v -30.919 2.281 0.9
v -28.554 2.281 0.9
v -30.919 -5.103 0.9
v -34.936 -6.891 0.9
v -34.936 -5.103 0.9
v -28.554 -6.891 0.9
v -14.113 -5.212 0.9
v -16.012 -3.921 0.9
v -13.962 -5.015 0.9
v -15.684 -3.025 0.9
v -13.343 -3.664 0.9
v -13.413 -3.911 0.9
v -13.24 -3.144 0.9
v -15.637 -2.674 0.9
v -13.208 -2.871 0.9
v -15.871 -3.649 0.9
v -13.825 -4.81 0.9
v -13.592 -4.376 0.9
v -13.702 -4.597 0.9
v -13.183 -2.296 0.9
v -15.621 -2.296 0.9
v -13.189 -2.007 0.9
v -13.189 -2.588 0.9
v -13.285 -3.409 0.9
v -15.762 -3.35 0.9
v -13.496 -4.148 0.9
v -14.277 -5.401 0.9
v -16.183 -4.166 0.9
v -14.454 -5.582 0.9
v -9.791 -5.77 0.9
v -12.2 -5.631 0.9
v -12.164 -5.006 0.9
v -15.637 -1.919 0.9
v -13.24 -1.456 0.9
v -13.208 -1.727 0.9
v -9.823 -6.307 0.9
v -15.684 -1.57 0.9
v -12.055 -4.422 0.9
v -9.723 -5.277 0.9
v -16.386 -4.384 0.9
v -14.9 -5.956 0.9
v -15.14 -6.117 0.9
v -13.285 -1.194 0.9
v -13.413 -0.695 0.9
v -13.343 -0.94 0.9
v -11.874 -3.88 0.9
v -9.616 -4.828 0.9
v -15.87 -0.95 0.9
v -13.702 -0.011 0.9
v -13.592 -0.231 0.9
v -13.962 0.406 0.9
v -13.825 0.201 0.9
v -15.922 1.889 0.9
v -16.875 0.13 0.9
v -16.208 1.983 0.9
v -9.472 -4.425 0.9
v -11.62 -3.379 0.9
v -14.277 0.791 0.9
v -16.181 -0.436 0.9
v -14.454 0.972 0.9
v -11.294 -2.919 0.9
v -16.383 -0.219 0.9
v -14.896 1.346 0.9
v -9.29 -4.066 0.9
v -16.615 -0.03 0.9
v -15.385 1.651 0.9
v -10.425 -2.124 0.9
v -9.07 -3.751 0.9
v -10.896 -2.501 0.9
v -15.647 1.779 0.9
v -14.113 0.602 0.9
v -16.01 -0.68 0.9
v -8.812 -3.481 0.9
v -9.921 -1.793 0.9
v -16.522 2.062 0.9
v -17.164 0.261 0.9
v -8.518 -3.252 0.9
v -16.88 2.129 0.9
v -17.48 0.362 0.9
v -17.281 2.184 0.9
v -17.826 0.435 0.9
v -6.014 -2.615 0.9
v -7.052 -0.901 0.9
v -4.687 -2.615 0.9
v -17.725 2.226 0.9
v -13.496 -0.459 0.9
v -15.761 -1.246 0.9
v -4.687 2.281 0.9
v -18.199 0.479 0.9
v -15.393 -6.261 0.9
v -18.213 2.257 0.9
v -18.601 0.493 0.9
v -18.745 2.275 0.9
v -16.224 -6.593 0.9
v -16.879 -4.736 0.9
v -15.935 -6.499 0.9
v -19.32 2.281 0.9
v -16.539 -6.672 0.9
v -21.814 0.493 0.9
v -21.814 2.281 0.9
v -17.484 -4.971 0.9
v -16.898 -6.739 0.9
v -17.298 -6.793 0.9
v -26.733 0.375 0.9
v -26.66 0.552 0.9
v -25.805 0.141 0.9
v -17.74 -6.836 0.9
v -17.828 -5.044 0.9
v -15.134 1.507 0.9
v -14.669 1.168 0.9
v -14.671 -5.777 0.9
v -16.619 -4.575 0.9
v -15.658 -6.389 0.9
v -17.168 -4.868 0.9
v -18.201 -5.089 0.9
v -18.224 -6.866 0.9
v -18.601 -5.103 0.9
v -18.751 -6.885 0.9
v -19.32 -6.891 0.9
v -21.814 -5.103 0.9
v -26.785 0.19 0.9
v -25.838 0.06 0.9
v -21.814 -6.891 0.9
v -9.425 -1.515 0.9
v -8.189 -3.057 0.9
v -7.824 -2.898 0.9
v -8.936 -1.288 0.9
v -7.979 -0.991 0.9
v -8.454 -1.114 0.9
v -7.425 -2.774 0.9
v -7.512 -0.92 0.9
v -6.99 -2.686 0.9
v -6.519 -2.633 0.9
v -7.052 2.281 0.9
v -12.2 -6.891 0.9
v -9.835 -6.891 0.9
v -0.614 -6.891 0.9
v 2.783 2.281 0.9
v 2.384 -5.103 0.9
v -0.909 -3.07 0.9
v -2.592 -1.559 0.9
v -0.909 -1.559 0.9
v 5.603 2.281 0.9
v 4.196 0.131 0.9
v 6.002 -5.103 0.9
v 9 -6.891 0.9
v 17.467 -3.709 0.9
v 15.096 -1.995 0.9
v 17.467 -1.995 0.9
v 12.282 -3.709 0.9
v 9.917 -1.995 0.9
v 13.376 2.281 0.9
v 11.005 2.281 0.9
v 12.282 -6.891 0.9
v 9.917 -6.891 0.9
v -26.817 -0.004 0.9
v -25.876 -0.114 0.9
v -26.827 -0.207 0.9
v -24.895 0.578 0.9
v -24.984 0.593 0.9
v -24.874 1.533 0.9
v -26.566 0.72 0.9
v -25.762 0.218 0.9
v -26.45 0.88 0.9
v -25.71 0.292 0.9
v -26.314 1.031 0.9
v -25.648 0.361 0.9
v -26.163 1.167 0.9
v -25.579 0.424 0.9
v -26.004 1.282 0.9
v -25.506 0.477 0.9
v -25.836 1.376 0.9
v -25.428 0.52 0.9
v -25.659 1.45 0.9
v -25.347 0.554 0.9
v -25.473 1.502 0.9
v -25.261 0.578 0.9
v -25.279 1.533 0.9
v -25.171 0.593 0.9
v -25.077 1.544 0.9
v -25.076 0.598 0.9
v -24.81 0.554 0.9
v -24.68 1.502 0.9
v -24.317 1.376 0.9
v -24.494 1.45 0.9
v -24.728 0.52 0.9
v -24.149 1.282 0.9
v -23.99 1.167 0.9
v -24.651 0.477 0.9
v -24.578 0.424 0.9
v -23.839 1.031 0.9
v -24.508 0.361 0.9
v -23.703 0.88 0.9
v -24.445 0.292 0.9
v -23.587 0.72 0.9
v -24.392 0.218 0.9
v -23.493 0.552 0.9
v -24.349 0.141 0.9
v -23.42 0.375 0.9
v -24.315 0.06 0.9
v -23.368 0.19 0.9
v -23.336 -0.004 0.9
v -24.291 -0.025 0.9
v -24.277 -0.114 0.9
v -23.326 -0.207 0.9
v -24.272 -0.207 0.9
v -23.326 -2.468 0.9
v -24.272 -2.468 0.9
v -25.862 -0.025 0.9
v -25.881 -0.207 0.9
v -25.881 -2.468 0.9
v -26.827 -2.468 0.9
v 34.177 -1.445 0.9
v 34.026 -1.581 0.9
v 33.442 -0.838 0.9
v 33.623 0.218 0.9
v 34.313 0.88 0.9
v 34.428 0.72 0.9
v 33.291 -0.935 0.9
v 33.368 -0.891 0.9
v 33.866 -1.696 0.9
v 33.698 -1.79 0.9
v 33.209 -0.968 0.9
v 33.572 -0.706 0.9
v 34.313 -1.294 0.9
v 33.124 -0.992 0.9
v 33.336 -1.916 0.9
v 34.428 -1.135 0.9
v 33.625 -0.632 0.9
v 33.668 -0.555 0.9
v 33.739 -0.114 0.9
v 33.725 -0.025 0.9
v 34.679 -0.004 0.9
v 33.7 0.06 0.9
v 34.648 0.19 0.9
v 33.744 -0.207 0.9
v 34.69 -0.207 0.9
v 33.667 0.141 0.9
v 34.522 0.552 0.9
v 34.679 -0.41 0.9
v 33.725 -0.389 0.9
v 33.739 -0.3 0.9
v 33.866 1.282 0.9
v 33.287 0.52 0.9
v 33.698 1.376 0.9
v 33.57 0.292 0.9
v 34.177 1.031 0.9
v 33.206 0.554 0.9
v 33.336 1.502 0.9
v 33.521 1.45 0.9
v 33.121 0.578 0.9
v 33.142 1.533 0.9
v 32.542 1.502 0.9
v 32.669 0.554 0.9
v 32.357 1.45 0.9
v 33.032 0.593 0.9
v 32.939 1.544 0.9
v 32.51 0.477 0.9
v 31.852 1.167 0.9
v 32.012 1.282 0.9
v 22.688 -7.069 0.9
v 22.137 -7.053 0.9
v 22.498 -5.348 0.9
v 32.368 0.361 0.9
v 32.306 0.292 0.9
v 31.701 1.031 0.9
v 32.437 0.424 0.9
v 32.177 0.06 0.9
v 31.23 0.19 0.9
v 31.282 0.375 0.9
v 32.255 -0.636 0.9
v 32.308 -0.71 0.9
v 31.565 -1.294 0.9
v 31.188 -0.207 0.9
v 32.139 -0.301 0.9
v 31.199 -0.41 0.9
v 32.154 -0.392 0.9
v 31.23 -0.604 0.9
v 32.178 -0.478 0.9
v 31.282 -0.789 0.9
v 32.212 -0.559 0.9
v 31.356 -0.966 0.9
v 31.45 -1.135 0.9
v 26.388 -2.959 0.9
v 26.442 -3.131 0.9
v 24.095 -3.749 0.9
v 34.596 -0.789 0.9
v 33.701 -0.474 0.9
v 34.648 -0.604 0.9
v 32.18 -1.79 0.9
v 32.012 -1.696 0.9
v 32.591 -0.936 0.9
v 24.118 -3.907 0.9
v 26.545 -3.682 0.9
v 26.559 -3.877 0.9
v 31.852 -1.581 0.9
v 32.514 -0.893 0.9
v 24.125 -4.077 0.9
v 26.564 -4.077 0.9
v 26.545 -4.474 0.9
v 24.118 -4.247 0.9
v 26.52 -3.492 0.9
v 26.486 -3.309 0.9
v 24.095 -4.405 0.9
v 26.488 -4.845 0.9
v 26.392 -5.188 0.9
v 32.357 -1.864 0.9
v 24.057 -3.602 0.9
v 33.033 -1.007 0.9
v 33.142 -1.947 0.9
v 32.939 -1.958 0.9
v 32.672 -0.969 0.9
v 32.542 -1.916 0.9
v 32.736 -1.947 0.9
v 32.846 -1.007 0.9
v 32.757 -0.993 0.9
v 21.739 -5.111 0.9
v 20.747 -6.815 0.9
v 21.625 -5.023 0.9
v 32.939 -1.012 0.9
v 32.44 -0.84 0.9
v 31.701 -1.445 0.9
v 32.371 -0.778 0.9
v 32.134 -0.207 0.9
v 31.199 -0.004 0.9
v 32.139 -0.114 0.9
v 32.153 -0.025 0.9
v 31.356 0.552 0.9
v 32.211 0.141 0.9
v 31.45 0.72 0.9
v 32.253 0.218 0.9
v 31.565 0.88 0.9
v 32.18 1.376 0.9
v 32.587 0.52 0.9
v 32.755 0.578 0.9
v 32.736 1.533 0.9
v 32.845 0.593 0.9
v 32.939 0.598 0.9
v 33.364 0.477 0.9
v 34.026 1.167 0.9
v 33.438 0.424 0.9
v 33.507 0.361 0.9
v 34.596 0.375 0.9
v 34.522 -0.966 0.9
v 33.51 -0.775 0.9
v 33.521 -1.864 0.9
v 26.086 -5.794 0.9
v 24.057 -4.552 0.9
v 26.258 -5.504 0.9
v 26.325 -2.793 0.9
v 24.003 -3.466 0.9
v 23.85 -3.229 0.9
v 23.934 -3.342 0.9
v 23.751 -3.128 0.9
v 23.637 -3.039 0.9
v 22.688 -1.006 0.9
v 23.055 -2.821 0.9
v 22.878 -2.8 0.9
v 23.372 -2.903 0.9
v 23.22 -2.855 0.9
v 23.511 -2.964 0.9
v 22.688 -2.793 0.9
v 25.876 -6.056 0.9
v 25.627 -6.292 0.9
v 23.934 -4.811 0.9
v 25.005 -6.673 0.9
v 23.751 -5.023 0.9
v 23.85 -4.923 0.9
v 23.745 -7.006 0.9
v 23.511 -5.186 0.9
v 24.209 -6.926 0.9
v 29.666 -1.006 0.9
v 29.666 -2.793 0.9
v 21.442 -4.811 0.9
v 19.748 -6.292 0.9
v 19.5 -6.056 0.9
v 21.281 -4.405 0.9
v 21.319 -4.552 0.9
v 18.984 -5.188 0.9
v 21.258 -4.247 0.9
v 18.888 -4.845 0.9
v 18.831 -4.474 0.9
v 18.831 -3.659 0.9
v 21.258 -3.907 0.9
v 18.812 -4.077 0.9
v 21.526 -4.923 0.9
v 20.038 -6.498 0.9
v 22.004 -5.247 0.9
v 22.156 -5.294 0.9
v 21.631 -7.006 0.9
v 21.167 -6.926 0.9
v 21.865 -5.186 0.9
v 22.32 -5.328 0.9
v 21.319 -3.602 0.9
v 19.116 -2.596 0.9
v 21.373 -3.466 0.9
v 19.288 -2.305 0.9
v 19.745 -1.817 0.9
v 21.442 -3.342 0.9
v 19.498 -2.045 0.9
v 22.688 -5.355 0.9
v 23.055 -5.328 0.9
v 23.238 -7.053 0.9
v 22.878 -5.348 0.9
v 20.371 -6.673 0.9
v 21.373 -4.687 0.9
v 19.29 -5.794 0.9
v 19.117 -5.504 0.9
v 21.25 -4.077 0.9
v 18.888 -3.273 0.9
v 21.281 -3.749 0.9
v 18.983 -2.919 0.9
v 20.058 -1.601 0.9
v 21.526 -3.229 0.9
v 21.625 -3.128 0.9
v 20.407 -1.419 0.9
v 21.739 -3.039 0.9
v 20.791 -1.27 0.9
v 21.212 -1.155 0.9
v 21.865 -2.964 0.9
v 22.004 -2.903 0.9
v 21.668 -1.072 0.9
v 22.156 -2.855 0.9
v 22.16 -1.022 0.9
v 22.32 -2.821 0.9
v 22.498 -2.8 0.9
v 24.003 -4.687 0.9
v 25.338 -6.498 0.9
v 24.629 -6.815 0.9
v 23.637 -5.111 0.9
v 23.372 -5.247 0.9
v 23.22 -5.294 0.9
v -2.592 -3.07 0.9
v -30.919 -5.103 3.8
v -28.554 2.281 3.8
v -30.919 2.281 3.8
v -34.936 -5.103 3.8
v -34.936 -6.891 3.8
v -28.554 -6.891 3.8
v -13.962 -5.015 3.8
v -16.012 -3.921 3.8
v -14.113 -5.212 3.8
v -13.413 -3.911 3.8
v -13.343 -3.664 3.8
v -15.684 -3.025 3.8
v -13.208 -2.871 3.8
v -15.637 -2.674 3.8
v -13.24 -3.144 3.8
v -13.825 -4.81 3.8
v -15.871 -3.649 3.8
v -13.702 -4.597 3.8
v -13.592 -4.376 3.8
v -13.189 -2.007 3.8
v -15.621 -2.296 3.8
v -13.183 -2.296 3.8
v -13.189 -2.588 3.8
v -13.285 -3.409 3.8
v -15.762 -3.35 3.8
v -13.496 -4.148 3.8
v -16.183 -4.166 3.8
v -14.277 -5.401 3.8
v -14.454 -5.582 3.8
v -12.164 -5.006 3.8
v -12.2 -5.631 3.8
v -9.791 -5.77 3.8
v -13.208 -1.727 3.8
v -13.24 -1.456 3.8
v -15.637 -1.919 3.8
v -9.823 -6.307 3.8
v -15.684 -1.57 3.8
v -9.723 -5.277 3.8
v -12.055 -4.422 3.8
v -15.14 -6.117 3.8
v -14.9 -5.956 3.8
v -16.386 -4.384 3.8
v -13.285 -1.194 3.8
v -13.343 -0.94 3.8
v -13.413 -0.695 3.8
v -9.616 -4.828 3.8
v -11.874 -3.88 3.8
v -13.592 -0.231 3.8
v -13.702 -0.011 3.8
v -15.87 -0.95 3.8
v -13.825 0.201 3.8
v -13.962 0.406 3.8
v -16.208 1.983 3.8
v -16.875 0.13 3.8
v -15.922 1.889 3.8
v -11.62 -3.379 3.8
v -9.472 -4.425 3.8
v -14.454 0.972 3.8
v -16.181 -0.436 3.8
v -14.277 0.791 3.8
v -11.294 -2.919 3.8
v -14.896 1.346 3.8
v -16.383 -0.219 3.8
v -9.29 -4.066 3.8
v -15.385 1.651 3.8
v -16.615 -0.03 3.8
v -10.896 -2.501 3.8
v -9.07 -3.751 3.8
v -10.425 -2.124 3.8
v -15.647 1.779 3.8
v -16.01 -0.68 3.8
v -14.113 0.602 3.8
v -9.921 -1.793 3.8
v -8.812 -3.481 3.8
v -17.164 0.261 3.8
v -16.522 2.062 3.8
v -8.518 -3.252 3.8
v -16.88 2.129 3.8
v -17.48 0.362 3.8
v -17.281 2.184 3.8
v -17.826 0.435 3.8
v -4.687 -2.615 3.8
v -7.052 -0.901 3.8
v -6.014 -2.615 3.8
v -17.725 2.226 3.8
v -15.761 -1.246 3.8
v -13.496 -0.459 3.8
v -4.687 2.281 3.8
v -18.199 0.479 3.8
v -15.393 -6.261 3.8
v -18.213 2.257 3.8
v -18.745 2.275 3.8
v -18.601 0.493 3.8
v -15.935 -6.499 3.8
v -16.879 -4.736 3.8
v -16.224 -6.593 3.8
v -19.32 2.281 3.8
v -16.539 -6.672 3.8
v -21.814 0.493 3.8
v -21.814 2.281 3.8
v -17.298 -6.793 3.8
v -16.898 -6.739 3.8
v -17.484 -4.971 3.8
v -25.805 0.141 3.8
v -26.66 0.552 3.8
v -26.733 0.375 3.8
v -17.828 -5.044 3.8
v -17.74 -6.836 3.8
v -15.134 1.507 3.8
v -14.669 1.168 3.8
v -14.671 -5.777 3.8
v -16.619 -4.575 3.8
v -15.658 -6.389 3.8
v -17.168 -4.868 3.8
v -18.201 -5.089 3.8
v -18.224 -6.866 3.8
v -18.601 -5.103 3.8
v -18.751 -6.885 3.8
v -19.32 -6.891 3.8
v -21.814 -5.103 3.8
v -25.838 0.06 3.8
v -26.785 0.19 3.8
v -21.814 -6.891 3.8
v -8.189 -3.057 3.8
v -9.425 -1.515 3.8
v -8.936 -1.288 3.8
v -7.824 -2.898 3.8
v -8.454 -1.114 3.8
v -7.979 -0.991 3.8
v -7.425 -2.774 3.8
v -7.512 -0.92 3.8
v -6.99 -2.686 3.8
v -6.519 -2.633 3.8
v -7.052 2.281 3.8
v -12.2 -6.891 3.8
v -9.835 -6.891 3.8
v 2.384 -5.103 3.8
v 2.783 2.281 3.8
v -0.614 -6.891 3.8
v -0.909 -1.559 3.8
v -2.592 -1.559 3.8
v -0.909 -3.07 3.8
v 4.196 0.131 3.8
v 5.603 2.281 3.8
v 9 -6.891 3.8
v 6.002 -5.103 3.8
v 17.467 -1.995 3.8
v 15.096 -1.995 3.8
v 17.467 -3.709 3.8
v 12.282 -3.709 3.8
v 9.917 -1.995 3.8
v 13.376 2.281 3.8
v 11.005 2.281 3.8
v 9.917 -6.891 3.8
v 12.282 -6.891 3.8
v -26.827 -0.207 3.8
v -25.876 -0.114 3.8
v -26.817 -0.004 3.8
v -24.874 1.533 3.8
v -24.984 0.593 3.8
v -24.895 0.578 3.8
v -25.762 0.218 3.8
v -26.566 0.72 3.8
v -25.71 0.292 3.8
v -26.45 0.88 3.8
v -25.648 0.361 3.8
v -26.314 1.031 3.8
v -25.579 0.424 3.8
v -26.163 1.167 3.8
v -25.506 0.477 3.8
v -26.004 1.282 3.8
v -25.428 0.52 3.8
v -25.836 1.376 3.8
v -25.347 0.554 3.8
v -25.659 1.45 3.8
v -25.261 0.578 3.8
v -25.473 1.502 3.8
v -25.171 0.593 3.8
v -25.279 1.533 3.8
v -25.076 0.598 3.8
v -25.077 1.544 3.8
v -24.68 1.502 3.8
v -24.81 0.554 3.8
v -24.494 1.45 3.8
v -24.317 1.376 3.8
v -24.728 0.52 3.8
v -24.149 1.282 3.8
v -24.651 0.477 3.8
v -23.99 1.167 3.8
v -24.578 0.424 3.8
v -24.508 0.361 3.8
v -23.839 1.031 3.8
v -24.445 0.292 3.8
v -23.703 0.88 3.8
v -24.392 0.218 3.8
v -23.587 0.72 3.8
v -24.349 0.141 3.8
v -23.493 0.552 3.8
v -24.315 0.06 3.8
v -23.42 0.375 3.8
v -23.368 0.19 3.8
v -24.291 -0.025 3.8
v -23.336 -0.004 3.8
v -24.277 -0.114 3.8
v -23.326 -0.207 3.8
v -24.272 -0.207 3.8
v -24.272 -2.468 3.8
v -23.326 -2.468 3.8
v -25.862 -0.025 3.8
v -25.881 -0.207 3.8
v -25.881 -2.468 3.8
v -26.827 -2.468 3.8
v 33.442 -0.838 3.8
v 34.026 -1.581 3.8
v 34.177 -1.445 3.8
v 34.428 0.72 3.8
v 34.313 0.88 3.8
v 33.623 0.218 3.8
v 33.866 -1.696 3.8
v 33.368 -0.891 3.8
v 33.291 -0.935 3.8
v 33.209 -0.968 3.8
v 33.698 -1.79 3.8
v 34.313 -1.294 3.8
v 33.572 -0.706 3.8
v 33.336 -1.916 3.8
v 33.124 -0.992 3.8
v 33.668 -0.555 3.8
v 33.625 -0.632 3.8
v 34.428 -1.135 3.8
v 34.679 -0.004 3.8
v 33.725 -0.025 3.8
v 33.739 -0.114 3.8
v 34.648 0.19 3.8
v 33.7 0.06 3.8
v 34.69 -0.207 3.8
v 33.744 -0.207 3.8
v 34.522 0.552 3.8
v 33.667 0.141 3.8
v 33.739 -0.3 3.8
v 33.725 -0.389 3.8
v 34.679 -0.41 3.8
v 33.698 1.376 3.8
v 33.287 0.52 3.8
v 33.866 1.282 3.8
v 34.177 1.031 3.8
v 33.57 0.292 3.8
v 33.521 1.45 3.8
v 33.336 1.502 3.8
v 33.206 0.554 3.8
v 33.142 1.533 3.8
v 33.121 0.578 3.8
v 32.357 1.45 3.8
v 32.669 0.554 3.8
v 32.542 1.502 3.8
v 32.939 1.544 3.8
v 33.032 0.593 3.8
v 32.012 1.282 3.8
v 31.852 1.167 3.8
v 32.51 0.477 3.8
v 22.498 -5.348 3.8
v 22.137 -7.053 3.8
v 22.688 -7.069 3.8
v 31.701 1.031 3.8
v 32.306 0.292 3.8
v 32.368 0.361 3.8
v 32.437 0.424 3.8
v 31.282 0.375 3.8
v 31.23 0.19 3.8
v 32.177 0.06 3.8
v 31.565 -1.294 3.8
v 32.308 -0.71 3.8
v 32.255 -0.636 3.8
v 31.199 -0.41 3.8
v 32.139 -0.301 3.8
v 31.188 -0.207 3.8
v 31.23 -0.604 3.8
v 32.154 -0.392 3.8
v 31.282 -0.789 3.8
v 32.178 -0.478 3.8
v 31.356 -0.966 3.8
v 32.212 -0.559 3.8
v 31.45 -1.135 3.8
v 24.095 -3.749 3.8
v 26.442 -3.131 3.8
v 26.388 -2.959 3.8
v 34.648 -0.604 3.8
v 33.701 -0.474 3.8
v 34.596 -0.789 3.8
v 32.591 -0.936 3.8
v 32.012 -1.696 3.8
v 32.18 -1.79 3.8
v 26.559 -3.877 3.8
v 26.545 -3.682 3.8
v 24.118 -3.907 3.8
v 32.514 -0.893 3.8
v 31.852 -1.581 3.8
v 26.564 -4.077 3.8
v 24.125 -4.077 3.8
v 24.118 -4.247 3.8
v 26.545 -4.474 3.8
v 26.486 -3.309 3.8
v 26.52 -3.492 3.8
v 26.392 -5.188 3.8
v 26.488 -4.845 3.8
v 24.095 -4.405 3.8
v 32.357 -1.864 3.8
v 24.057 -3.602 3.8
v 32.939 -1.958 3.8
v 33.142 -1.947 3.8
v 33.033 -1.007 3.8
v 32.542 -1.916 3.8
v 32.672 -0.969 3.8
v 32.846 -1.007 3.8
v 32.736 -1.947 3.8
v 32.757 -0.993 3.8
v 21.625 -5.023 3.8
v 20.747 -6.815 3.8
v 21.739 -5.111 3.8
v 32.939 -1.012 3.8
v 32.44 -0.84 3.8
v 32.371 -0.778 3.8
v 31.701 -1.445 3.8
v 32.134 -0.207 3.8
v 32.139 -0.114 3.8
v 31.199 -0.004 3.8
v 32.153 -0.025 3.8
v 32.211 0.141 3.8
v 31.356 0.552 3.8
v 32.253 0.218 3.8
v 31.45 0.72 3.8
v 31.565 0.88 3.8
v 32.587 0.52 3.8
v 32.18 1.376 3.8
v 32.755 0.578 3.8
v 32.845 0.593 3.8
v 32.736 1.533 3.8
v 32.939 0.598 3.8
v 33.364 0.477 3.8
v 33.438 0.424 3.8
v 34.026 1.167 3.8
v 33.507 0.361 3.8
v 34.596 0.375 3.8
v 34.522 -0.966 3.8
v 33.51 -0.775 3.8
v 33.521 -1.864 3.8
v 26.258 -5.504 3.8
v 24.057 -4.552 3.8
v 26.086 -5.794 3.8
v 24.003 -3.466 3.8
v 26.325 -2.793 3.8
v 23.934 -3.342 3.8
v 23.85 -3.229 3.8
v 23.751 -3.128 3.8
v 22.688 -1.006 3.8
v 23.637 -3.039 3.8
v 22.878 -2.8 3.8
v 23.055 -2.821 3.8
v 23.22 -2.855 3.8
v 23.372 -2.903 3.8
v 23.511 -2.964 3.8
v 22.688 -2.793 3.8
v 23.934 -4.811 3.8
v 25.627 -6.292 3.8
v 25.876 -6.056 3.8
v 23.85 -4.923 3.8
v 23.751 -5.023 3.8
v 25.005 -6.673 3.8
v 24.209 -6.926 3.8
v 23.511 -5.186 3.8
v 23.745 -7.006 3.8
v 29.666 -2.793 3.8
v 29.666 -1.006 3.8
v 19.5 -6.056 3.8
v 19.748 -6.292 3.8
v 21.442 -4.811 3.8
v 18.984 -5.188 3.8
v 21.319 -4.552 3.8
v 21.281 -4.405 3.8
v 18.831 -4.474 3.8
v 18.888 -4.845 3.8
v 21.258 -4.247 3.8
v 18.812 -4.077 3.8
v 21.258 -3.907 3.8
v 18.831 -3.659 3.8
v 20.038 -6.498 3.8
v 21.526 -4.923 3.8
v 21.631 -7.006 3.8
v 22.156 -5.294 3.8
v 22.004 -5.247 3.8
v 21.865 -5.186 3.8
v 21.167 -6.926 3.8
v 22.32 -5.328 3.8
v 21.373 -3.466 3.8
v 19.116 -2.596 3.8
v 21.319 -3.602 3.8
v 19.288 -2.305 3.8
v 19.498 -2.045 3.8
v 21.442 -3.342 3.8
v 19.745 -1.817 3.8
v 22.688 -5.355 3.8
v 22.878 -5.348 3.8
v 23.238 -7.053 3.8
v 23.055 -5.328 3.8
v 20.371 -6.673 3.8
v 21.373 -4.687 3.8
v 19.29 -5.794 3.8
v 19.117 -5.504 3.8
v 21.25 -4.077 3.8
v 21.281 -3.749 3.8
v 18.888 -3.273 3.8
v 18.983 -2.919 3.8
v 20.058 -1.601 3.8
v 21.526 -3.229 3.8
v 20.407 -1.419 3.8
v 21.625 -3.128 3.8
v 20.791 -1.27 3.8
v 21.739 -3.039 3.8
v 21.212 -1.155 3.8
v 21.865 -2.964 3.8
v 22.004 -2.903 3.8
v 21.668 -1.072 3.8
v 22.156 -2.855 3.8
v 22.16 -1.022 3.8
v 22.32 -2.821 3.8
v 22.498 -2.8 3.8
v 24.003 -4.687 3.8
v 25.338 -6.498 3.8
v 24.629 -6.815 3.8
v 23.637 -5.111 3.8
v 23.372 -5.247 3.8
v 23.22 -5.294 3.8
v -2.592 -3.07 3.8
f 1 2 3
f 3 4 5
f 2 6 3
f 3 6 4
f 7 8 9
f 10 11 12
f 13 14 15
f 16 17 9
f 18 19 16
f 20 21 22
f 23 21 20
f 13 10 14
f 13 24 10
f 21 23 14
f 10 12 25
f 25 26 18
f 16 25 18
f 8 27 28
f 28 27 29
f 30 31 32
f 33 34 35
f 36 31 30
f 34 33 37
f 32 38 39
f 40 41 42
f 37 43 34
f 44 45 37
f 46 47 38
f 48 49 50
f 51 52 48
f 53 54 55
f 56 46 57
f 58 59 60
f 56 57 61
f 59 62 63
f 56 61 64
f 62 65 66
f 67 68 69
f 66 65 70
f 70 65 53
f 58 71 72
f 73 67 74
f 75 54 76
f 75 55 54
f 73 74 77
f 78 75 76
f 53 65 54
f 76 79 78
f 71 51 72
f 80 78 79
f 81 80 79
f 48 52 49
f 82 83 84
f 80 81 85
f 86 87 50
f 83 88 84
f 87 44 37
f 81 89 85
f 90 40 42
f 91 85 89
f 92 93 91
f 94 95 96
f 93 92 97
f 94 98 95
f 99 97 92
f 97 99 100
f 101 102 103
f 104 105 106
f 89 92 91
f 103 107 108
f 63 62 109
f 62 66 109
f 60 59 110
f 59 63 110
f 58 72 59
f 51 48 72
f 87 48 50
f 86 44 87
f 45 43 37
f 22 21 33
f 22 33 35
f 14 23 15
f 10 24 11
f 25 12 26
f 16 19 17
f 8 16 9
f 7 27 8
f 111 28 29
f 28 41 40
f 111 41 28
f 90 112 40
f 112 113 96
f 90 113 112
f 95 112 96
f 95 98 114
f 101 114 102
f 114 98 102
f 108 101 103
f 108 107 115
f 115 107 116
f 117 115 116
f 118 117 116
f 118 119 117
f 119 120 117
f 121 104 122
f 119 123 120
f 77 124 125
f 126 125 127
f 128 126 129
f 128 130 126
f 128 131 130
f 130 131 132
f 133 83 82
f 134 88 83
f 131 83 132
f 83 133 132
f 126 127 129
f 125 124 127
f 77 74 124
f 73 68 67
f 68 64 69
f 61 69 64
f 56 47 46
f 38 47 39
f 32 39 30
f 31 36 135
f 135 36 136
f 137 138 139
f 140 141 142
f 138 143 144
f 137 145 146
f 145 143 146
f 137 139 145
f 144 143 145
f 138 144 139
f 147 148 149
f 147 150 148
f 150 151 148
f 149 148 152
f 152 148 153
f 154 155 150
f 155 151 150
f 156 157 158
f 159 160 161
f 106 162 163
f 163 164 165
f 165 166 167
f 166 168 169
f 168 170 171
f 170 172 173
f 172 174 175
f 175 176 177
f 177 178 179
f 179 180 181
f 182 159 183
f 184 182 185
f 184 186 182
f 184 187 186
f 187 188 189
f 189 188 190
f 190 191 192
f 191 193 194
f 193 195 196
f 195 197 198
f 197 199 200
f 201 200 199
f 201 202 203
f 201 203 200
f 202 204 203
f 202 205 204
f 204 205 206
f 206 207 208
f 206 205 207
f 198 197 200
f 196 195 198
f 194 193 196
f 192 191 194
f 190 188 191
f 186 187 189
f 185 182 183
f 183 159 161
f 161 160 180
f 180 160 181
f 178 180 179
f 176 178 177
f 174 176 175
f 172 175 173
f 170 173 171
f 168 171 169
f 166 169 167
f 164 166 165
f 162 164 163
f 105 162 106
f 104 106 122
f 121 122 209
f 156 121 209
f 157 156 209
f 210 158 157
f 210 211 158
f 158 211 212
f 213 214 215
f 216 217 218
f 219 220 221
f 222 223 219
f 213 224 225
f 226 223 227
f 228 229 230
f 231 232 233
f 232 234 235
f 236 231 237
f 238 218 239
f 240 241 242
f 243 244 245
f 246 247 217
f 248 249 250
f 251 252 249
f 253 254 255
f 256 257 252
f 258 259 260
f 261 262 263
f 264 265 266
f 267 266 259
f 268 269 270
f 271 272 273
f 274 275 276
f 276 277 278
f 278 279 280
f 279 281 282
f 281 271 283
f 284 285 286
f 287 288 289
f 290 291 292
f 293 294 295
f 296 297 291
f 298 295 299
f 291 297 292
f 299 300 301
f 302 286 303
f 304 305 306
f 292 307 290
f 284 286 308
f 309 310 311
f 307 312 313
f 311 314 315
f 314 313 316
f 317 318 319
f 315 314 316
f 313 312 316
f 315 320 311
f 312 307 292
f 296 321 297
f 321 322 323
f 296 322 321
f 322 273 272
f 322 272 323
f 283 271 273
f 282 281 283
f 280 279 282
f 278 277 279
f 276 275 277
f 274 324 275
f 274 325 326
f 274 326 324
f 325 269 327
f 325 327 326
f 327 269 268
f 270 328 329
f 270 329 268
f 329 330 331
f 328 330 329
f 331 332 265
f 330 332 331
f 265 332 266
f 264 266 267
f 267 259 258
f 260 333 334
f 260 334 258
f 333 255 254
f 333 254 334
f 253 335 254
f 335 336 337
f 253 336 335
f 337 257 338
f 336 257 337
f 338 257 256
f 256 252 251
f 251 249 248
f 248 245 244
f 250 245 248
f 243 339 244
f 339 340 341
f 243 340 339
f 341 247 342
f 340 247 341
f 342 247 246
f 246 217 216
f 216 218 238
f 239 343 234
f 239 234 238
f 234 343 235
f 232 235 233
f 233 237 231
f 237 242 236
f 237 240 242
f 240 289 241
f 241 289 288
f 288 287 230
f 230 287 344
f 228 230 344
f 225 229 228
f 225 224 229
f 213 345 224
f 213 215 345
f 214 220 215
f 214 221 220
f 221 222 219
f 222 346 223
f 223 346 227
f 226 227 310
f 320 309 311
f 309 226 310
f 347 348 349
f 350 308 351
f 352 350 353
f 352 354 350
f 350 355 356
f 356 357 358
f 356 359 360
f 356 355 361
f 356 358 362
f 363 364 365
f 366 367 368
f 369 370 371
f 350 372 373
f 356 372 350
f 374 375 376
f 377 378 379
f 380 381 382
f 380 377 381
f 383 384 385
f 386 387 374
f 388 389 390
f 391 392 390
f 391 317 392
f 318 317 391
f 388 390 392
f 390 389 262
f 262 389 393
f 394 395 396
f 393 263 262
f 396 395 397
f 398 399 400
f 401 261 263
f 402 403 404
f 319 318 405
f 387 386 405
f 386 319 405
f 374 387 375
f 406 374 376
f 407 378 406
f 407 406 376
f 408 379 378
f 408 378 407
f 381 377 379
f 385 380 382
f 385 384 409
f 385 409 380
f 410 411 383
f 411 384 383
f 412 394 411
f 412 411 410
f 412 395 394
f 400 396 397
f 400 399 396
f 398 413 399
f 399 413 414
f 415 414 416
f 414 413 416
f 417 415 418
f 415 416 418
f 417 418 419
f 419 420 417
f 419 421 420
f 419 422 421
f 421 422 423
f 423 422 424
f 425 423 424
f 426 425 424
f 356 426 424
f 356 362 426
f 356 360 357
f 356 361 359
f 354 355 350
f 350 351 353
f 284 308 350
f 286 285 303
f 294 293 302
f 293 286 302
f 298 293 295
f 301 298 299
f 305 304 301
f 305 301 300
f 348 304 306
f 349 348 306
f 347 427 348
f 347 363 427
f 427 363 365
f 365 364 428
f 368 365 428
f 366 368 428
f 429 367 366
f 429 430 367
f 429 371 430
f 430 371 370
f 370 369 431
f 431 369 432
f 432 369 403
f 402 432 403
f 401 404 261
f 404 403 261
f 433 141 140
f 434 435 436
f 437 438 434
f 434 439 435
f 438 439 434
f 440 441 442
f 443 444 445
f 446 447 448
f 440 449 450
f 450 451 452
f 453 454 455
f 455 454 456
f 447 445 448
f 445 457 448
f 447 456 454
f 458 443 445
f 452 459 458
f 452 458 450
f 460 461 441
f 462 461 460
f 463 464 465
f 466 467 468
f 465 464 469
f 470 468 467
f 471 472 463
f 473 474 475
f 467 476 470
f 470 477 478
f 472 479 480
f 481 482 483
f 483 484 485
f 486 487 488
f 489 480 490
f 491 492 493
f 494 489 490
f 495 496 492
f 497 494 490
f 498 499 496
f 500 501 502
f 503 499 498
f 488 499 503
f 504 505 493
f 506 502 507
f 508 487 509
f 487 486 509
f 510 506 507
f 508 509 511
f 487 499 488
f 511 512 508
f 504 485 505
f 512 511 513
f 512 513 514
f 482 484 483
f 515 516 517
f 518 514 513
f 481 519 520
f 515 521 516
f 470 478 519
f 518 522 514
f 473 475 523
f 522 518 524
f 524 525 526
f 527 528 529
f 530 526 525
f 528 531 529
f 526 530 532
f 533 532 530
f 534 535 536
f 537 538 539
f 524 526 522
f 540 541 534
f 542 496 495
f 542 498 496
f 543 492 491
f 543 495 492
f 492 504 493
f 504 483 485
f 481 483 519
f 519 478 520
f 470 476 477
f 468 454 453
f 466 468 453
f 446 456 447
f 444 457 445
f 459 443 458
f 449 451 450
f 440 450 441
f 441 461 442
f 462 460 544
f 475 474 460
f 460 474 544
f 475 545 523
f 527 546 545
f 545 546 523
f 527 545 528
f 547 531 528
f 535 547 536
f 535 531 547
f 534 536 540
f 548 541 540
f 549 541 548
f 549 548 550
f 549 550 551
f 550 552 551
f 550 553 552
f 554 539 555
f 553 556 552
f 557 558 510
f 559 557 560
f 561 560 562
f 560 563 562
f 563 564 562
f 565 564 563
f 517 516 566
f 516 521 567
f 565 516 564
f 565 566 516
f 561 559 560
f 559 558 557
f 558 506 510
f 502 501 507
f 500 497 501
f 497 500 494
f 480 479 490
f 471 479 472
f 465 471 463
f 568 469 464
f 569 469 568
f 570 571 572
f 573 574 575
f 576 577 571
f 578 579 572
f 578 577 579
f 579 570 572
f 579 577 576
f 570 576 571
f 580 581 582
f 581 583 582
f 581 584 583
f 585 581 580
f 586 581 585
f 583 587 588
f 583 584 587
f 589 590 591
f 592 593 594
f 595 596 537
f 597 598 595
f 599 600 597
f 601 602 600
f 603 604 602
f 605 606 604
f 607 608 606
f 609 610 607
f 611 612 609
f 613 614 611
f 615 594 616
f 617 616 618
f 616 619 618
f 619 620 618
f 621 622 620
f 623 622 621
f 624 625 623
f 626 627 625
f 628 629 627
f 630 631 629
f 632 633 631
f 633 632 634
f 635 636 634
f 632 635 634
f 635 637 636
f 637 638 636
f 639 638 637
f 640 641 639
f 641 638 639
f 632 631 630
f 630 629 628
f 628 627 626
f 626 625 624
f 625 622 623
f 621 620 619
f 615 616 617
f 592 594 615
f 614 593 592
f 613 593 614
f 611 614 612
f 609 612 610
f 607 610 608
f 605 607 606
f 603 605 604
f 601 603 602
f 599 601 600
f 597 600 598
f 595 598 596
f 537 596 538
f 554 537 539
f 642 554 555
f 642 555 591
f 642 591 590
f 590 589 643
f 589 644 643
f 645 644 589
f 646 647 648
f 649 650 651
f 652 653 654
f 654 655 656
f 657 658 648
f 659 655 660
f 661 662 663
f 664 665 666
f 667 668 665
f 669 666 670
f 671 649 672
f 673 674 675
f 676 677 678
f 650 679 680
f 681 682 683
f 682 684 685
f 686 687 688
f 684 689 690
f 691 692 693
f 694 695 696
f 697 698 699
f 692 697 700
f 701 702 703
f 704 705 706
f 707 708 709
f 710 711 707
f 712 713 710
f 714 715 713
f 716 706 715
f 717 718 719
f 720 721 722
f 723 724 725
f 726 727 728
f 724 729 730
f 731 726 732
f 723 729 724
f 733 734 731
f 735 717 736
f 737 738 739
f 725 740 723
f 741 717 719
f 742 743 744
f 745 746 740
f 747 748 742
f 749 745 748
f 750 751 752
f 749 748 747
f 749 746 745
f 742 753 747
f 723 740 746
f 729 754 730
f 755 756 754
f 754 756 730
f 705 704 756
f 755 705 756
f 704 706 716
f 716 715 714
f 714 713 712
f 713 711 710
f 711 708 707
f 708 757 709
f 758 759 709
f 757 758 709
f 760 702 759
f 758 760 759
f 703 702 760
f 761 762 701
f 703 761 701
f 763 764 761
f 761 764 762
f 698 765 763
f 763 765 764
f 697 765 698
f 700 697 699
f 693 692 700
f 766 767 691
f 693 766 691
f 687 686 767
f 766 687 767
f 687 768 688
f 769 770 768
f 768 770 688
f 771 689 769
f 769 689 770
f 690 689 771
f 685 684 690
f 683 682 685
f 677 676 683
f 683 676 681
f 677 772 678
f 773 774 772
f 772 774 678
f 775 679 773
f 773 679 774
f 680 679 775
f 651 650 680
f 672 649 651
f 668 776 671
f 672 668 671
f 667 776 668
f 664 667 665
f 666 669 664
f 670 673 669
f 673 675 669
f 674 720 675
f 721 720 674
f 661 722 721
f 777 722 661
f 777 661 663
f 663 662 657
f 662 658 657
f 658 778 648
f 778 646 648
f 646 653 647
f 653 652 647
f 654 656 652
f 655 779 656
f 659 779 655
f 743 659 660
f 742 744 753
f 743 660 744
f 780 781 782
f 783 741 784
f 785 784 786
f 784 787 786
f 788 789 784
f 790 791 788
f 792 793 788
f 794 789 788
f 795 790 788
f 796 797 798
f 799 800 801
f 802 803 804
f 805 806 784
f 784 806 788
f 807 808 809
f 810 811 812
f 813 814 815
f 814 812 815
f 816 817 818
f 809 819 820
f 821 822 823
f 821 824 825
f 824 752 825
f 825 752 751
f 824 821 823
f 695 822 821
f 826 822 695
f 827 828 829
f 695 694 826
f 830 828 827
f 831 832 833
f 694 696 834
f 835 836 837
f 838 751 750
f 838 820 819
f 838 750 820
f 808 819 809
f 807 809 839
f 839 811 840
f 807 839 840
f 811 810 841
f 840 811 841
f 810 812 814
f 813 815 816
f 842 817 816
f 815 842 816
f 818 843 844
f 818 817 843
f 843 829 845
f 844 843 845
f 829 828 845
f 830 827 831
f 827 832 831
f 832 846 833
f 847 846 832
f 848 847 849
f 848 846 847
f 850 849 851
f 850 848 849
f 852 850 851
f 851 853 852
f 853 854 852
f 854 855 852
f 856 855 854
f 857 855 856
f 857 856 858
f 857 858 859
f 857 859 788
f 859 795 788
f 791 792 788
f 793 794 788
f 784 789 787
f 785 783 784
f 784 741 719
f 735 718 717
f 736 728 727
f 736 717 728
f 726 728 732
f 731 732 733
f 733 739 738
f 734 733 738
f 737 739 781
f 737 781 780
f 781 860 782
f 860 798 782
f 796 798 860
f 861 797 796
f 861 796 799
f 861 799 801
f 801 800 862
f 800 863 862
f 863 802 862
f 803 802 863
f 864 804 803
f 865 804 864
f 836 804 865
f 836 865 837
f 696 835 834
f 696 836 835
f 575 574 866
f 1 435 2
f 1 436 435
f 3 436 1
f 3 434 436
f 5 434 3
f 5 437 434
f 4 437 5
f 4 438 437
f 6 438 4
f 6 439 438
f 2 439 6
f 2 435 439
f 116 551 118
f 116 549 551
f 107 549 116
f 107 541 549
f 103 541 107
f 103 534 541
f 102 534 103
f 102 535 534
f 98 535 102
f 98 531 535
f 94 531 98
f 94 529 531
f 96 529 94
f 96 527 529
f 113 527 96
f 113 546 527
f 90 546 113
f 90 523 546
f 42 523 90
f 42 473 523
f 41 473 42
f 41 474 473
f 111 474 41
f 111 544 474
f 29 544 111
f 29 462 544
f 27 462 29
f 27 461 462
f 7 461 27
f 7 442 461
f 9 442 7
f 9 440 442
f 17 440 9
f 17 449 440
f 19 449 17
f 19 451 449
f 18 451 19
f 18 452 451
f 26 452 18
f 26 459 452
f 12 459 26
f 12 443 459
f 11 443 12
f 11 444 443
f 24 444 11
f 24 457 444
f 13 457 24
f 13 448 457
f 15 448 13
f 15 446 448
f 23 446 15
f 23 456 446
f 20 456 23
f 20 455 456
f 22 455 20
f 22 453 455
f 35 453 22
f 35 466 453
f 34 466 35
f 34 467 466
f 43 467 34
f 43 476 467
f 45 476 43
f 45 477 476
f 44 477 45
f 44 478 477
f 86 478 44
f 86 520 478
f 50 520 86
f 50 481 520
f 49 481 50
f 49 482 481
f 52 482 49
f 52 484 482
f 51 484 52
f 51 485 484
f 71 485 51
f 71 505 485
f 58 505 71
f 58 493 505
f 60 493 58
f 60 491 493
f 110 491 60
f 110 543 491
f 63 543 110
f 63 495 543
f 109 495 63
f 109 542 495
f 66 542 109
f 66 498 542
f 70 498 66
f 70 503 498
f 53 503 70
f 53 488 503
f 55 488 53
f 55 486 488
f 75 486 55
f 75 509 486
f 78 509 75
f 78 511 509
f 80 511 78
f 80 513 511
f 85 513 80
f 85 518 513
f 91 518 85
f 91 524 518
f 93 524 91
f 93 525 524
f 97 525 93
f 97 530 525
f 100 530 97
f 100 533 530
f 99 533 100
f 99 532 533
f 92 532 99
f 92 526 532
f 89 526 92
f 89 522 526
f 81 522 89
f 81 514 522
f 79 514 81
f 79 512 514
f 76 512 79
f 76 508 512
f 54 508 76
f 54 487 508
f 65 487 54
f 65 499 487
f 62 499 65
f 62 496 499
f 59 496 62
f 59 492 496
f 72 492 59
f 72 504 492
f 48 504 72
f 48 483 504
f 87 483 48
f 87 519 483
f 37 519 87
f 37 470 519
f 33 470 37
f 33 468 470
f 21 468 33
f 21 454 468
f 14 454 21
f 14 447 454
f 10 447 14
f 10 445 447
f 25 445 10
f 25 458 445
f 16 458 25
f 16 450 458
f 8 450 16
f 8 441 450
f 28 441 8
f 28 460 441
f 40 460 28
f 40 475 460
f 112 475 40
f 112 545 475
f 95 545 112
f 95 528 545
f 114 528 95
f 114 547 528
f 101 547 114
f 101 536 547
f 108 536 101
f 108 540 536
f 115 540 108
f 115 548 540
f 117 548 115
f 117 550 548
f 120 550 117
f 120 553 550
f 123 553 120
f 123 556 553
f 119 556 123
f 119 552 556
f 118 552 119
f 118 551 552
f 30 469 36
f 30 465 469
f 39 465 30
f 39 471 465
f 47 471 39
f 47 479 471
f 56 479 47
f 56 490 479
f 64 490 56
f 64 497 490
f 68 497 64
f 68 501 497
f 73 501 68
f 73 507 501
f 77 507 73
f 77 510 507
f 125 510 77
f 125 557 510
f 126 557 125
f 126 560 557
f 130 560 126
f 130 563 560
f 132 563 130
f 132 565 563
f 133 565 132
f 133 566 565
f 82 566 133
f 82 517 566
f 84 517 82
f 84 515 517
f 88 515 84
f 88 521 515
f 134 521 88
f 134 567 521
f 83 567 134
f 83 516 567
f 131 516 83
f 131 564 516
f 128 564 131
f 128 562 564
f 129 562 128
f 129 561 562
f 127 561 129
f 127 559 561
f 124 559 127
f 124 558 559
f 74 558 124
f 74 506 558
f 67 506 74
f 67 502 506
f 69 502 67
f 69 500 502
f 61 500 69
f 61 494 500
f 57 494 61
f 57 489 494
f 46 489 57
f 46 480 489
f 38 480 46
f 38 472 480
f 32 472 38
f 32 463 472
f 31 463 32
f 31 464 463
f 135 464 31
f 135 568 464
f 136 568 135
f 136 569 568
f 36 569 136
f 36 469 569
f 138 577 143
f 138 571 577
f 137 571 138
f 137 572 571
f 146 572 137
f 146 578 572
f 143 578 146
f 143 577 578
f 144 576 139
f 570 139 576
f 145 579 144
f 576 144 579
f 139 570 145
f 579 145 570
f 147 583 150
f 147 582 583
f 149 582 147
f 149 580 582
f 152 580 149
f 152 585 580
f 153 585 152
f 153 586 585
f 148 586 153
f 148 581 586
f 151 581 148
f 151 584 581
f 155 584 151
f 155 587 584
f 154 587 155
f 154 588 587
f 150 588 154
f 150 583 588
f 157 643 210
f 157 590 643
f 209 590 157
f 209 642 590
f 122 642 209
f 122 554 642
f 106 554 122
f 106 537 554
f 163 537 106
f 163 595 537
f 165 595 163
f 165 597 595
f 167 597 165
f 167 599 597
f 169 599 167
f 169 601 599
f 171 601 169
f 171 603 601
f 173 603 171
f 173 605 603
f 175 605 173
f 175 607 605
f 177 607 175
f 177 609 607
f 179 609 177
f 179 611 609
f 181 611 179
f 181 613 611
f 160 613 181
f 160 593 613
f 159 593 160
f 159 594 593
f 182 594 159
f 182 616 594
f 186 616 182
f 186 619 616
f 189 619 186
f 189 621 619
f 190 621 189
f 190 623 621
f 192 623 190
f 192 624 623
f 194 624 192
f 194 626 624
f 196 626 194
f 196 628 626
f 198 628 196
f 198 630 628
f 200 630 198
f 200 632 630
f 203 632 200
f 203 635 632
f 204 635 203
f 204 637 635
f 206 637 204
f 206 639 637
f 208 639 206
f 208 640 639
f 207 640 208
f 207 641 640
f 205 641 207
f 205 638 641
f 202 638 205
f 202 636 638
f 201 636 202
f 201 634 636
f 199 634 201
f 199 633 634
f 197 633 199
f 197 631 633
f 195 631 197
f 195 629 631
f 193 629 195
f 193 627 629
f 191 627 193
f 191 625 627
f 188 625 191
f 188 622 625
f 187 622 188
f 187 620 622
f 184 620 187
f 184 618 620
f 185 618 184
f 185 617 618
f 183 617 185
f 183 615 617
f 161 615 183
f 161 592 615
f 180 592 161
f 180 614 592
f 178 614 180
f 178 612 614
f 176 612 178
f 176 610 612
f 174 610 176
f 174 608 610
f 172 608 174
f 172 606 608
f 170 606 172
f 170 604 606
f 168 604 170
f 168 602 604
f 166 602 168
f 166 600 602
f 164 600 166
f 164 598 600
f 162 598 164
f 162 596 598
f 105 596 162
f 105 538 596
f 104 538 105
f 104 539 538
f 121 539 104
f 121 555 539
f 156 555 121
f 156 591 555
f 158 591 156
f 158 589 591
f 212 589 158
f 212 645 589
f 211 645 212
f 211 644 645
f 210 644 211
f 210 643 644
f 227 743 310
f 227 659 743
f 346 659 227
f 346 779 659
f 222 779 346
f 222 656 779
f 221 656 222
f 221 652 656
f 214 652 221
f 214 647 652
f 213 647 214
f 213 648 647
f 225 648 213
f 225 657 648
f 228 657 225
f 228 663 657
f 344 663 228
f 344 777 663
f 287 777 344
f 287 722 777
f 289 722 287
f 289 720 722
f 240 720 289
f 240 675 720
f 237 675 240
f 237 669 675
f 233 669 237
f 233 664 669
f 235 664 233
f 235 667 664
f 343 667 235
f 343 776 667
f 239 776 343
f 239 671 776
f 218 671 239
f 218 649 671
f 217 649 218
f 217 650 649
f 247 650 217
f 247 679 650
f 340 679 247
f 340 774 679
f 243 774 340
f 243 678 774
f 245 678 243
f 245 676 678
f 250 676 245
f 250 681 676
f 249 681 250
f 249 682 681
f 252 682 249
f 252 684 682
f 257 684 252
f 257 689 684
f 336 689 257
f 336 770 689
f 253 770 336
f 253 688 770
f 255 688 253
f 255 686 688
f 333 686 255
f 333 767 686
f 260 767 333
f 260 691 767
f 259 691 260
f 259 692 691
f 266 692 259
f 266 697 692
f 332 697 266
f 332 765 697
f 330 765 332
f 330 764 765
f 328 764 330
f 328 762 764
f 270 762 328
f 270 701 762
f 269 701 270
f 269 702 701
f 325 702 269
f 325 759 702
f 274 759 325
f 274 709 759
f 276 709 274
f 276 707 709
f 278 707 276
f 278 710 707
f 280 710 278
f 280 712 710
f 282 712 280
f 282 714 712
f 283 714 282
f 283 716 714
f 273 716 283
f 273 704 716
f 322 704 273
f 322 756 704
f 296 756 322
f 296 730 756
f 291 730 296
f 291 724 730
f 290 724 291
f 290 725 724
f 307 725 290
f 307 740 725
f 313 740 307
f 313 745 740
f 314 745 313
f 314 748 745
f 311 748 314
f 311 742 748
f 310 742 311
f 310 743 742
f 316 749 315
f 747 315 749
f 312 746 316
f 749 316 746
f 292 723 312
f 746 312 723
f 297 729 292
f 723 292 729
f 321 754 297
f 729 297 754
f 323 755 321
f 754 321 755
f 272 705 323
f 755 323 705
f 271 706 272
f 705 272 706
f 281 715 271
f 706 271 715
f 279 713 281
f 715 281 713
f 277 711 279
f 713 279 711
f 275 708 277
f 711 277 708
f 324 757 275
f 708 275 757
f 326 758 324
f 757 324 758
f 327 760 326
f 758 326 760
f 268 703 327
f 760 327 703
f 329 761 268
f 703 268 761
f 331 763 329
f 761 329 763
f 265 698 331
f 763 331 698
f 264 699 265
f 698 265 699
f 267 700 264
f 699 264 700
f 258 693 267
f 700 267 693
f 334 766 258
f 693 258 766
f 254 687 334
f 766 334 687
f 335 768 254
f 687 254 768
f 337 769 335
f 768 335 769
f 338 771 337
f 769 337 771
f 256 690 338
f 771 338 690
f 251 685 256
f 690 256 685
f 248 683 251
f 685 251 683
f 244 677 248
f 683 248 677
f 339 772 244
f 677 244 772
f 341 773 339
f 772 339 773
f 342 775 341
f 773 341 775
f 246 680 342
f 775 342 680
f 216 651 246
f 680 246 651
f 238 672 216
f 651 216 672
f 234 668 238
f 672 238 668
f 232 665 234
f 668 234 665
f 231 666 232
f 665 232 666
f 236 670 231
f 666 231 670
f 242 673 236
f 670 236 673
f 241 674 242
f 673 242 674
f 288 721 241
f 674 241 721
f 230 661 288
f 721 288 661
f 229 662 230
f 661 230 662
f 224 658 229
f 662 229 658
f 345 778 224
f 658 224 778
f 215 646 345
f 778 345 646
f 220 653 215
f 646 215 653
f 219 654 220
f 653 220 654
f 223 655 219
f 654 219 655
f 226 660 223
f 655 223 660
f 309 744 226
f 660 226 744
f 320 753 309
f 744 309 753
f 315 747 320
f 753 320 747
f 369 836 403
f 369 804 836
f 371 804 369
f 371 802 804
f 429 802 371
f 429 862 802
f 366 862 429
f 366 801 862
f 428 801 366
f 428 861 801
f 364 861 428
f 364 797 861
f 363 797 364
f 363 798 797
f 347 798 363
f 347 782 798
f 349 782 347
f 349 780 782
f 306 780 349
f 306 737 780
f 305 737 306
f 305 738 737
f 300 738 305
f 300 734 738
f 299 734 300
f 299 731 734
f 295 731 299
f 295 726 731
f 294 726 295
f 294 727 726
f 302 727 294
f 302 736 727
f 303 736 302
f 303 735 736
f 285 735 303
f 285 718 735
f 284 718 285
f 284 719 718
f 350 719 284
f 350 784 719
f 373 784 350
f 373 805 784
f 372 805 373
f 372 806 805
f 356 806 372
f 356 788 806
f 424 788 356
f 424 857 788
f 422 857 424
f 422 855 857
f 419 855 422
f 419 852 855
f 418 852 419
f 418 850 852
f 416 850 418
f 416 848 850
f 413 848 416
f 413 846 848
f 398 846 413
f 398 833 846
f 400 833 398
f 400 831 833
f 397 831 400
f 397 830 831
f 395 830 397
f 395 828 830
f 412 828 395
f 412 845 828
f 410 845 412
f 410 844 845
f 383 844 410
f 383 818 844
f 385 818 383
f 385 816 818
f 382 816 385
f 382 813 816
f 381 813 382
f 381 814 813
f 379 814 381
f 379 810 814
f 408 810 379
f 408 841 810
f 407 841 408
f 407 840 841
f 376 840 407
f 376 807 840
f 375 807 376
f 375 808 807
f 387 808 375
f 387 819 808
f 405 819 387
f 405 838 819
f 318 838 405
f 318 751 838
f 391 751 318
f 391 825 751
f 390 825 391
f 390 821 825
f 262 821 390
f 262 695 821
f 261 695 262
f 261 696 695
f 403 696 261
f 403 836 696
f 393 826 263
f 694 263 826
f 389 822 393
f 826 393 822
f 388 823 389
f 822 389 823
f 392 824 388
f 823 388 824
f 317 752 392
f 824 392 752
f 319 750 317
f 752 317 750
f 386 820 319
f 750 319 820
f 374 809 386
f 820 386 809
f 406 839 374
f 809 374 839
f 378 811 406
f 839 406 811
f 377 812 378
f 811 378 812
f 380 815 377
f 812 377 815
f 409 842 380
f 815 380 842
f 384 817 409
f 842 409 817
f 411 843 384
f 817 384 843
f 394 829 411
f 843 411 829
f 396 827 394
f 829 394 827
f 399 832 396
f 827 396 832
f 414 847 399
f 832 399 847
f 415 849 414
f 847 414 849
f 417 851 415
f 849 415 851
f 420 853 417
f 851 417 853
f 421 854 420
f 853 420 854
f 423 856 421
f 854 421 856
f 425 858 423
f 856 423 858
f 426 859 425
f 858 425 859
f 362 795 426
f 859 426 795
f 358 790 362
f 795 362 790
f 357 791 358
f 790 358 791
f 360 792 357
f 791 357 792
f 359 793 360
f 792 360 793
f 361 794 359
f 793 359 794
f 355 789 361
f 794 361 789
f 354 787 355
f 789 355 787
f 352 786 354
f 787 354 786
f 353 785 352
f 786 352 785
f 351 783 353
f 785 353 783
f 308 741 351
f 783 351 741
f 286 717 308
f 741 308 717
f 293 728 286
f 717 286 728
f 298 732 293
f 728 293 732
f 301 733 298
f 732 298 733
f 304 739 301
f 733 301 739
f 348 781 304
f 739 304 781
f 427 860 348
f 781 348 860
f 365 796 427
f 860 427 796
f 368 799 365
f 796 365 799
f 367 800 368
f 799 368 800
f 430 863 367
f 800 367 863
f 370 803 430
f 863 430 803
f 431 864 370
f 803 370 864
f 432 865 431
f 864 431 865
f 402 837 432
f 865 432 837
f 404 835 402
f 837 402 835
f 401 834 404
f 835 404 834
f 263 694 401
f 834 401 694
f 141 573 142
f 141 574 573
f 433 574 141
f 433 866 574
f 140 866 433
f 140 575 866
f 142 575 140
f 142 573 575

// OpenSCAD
$fn = 48;
  // syllabics (overlaid on icon, tallest)
  translate([0, -2.500, 0.900]) linear_extrude(height=2.900) text("ᒧᐢᑐᓱᐎᔨᓂᐤ", size=9.059, halign="center", valign="center", font="Euphemia UCAS:style=Bold");
